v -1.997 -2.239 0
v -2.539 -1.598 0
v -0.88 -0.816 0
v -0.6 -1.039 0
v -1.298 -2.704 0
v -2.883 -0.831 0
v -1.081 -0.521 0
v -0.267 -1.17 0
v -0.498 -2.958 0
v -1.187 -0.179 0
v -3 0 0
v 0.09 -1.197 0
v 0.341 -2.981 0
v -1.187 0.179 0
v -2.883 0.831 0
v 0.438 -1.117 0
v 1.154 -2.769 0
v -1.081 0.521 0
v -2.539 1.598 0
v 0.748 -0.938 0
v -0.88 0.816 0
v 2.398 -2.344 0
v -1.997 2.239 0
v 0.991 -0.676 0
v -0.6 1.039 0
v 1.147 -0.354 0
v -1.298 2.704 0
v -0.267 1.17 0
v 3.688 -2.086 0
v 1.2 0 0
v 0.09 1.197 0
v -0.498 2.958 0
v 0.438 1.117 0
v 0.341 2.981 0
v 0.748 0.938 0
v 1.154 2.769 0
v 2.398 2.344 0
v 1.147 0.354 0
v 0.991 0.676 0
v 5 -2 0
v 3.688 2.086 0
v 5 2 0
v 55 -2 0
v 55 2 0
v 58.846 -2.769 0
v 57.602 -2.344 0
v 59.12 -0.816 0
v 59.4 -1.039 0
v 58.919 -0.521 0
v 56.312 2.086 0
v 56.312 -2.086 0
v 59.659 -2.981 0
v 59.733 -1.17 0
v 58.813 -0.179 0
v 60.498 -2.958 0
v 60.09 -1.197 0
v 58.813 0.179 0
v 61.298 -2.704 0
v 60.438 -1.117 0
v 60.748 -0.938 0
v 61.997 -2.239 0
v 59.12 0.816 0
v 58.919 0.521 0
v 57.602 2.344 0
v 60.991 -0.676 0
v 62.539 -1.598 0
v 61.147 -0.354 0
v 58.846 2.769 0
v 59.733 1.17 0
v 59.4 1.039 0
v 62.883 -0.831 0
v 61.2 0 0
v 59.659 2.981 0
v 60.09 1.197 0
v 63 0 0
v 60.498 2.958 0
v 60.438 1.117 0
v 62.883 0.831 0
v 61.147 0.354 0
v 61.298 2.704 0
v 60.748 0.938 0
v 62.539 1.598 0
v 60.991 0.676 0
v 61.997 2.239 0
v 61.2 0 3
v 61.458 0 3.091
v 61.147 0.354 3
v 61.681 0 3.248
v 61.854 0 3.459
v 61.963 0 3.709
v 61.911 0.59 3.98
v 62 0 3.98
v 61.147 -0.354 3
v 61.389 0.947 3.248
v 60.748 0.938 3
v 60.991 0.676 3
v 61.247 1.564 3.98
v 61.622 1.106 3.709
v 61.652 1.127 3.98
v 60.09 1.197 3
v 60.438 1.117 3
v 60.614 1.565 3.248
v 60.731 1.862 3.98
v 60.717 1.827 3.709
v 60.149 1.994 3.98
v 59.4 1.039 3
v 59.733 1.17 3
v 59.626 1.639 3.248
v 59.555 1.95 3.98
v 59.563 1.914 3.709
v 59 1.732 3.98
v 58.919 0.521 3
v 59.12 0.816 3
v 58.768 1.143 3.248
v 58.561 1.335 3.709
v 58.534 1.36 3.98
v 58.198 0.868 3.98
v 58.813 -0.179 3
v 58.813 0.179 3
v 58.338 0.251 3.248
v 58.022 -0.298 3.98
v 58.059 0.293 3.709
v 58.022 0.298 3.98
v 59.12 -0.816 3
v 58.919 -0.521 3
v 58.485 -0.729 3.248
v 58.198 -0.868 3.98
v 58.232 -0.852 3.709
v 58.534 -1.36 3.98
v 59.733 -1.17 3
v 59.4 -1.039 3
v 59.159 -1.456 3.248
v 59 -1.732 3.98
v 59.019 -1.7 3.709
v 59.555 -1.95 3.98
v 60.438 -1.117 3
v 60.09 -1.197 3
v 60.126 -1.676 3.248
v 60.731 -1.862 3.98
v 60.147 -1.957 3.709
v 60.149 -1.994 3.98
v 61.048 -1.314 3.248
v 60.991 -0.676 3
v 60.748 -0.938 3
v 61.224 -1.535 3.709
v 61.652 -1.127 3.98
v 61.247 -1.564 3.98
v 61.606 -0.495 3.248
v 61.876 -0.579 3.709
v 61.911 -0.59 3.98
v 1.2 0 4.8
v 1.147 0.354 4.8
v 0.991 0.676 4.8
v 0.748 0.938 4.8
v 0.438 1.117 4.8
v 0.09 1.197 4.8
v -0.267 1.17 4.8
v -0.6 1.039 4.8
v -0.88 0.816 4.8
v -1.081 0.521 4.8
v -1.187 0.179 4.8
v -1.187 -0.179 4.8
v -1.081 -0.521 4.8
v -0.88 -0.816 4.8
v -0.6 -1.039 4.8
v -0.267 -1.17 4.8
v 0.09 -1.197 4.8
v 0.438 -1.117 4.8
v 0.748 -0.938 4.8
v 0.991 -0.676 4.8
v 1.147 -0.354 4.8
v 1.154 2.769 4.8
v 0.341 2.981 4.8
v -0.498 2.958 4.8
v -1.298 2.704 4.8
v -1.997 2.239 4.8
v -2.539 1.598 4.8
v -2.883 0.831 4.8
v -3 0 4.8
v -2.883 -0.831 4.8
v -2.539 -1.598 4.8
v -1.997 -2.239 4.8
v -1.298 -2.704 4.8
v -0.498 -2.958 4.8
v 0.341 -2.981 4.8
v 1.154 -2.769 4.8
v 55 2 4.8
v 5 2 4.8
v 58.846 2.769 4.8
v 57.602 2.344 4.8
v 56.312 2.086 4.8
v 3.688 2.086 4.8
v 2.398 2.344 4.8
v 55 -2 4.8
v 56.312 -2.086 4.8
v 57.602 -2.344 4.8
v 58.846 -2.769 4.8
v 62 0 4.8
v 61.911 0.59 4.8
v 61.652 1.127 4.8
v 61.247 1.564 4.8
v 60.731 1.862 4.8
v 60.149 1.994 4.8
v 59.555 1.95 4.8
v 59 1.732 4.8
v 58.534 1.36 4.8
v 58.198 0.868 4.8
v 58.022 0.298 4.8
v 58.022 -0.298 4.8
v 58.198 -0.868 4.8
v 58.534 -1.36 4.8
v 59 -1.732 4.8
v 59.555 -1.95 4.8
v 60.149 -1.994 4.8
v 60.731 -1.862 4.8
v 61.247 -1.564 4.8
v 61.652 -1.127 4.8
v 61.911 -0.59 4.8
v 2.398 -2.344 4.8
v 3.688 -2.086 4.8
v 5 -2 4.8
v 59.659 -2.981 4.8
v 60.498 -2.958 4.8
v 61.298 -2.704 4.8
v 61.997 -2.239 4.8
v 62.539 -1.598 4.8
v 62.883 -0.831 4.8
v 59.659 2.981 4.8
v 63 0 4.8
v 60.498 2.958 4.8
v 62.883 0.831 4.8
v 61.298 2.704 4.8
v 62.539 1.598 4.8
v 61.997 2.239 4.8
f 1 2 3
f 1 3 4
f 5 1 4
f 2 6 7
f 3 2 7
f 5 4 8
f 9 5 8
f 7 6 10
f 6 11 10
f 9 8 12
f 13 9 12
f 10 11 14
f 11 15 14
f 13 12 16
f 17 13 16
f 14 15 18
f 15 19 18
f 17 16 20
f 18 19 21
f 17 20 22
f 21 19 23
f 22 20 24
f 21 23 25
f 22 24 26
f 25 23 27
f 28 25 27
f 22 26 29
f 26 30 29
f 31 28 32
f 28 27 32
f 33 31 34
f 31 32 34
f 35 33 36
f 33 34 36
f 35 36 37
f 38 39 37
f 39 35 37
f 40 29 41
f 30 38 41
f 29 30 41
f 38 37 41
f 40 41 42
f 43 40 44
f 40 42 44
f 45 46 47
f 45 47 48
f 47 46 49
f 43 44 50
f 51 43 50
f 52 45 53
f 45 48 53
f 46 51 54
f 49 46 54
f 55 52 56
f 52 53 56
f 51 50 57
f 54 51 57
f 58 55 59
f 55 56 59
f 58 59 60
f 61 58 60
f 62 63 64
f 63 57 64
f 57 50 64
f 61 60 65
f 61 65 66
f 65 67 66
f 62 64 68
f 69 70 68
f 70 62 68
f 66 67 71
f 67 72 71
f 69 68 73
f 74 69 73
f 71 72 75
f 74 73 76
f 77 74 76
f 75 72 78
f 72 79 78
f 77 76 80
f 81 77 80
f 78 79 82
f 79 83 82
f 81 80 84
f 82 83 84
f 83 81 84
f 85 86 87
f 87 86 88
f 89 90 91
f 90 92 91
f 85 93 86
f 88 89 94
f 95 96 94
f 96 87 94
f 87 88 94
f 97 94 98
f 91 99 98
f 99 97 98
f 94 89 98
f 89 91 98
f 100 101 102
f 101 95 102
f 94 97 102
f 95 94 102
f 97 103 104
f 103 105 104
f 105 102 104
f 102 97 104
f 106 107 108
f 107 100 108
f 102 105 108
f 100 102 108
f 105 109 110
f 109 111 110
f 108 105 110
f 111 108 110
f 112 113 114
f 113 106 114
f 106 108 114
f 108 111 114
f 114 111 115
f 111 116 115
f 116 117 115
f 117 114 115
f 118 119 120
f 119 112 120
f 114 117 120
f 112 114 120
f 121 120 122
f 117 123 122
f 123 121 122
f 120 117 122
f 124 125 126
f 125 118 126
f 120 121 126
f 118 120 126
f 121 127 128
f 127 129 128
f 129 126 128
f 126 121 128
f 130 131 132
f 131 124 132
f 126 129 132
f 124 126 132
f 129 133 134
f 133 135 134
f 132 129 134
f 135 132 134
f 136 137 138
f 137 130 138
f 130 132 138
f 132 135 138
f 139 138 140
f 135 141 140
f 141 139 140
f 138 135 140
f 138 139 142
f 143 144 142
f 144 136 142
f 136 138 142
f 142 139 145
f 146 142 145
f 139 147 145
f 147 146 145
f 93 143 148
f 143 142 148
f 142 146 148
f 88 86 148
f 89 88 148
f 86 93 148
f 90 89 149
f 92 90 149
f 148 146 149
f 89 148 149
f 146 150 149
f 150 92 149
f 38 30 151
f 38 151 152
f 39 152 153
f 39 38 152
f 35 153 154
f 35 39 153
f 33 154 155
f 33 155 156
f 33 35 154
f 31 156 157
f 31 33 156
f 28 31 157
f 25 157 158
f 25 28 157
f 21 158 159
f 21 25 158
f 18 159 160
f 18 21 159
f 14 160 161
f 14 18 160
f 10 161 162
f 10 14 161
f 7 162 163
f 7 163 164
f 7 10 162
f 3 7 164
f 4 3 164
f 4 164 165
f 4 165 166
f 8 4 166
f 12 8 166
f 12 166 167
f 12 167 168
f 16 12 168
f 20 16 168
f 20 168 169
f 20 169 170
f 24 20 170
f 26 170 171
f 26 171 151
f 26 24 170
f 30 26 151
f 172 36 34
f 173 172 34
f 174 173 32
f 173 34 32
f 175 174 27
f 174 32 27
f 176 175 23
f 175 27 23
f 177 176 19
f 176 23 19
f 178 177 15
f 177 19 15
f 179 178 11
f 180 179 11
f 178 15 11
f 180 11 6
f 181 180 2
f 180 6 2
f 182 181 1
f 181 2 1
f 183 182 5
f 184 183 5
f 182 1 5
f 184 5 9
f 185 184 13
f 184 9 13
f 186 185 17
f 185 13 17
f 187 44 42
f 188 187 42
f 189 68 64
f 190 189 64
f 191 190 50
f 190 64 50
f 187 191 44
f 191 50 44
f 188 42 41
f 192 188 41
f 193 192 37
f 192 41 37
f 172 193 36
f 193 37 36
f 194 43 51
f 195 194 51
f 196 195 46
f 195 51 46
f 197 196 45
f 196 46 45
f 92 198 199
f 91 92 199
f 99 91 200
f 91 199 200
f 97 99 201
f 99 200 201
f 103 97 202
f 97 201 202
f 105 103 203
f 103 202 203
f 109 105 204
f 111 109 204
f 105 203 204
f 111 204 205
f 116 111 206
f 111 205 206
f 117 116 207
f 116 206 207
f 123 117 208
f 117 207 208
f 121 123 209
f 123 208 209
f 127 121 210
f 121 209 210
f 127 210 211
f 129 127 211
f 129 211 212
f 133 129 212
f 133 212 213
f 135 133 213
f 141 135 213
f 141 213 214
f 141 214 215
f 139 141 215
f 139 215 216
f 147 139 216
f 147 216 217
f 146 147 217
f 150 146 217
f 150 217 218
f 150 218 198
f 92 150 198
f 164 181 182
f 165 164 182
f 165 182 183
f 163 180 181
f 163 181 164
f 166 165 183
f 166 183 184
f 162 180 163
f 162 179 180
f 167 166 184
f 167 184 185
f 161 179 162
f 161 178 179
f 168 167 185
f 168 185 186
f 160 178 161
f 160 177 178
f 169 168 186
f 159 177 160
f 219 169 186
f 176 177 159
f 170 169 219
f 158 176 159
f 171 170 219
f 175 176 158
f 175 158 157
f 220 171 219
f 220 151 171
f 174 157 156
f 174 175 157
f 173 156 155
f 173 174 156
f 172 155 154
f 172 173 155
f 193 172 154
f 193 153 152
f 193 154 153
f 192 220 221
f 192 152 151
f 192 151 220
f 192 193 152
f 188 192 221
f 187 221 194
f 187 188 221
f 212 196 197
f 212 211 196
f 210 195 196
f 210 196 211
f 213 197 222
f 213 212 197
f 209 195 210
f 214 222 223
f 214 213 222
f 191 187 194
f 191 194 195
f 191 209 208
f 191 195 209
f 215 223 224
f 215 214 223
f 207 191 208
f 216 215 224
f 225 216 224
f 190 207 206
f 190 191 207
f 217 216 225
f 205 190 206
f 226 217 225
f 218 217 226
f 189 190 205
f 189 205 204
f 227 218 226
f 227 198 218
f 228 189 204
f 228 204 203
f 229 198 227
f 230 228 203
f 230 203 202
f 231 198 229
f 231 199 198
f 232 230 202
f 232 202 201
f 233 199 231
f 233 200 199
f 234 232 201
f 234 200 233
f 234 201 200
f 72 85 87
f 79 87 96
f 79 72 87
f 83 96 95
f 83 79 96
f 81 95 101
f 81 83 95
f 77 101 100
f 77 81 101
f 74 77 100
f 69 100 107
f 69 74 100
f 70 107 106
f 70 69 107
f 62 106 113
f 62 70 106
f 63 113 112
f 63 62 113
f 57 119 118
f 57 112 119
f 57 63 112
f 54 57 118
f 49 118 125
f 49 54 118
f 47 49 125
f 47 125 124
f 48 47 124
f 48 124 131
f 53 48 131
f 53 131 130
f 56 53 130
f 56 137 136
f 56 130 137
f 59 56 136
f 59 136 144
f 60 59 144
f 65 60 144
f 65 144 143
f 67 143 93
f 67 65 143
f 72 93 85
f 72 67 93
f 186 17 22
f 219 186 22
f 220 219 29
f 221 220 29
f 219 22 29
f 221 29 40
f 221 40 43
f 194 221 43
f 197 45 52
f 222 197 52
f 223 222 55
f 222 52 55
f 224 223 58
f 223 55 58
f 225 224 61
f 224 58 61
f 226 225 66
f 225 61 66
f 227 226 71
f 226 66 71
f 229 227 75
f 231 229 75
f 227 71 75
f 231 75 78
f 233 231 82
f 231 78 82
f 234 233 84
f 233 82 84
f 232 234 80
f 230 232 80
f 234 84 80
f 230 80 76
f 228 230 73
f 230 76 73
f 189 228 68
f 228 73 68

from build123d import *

# Parameters (mm, degrees)
SKETCH1_R           = 1.2
BOSS_EXTRUDE1_DEPTH = 4.8
SKETCH2_R           = 2
CUT_EXTRUDE1_DEPTH  = 1.8
FILLET1_R           = 1


with BuildPart() as part:
    # Sketch1 → Boss-Extrude1 (new body)
    with BuildSketch(Plane.XY):
        with BuildLine():
            Line((5, -2), (55, -2))
            ThreePointArc((55, -2), (56.961161351, -2.194193243), (58.846153846, -2.769230769))
            ThreePointArc((58.846153846, -2.769230769), (63, 0), (58.846153846, 2.769230769))
            ThreePointArc((58.846153846, 2.769230769), (56.961161351, 2.194193243), (55, 2))
            Line((55, 2), (5, 2))
            ThreePointArc((5, 2), (3.038838649, 2.194193243), (1.153846154, 2.769230769))
            ThreePointArc((1.153846154, 2.769230769), (-3, 0), (1.153846154, -2.769230769))
            ThreePointArc((1.153846154, -2.769230769), (3.038838649, -2.194193243), (5, -2))
        make_face()
        Circle(SKETCH1_R, mode=Mode.SUBTRACT)
        with Locations((60, 0)):
            Circle(SKETCH1_R, mode=Mode.SUBTRACT)
    extrude(amount=BOSS_EXTRUDE1_DEPTH)

    # Sketch2 → Cut-Extrude1 (cut)
    with BuildSketch(Plane.XY.offset(4.8)):
        with Locations((60, 0)):
            Circle(SKETCH2_R)
    extrude(amount=-CUT_EXTRUDE1_DEPTH, mode=Mode.SUBTRACT)

    # Fillet1
    # the kernel refuses this fillet: 1 mm, written as the material it adds along each edge
    with BuildSketch(Plane(origin=(60, 0, 3), x_dir=(1, 0, 0), z_dir=(0, -1, 0))) as fillet1_piece_1:
        with BuildLine():
            CenterArc((1, 0.979795897), FILLET1_R, 281.536959033, 78.463040967)
            Line((1.2, 0), (1.204, -0.019595918))
            ThreePointArc((1.204, -0.019595918), (1.6, -0.02), (2, -0.02))
            Line((2, -0.02), (2.02, 0))
            Line((2.02, 0), (2.02, 0.979795897))
            Line((2.02, 0.979795897), (2, 0.979795897))
        make_face()
    revolve(axis=Axis((60, 0, 3), (0, 0, 1)))


solid = part.part
